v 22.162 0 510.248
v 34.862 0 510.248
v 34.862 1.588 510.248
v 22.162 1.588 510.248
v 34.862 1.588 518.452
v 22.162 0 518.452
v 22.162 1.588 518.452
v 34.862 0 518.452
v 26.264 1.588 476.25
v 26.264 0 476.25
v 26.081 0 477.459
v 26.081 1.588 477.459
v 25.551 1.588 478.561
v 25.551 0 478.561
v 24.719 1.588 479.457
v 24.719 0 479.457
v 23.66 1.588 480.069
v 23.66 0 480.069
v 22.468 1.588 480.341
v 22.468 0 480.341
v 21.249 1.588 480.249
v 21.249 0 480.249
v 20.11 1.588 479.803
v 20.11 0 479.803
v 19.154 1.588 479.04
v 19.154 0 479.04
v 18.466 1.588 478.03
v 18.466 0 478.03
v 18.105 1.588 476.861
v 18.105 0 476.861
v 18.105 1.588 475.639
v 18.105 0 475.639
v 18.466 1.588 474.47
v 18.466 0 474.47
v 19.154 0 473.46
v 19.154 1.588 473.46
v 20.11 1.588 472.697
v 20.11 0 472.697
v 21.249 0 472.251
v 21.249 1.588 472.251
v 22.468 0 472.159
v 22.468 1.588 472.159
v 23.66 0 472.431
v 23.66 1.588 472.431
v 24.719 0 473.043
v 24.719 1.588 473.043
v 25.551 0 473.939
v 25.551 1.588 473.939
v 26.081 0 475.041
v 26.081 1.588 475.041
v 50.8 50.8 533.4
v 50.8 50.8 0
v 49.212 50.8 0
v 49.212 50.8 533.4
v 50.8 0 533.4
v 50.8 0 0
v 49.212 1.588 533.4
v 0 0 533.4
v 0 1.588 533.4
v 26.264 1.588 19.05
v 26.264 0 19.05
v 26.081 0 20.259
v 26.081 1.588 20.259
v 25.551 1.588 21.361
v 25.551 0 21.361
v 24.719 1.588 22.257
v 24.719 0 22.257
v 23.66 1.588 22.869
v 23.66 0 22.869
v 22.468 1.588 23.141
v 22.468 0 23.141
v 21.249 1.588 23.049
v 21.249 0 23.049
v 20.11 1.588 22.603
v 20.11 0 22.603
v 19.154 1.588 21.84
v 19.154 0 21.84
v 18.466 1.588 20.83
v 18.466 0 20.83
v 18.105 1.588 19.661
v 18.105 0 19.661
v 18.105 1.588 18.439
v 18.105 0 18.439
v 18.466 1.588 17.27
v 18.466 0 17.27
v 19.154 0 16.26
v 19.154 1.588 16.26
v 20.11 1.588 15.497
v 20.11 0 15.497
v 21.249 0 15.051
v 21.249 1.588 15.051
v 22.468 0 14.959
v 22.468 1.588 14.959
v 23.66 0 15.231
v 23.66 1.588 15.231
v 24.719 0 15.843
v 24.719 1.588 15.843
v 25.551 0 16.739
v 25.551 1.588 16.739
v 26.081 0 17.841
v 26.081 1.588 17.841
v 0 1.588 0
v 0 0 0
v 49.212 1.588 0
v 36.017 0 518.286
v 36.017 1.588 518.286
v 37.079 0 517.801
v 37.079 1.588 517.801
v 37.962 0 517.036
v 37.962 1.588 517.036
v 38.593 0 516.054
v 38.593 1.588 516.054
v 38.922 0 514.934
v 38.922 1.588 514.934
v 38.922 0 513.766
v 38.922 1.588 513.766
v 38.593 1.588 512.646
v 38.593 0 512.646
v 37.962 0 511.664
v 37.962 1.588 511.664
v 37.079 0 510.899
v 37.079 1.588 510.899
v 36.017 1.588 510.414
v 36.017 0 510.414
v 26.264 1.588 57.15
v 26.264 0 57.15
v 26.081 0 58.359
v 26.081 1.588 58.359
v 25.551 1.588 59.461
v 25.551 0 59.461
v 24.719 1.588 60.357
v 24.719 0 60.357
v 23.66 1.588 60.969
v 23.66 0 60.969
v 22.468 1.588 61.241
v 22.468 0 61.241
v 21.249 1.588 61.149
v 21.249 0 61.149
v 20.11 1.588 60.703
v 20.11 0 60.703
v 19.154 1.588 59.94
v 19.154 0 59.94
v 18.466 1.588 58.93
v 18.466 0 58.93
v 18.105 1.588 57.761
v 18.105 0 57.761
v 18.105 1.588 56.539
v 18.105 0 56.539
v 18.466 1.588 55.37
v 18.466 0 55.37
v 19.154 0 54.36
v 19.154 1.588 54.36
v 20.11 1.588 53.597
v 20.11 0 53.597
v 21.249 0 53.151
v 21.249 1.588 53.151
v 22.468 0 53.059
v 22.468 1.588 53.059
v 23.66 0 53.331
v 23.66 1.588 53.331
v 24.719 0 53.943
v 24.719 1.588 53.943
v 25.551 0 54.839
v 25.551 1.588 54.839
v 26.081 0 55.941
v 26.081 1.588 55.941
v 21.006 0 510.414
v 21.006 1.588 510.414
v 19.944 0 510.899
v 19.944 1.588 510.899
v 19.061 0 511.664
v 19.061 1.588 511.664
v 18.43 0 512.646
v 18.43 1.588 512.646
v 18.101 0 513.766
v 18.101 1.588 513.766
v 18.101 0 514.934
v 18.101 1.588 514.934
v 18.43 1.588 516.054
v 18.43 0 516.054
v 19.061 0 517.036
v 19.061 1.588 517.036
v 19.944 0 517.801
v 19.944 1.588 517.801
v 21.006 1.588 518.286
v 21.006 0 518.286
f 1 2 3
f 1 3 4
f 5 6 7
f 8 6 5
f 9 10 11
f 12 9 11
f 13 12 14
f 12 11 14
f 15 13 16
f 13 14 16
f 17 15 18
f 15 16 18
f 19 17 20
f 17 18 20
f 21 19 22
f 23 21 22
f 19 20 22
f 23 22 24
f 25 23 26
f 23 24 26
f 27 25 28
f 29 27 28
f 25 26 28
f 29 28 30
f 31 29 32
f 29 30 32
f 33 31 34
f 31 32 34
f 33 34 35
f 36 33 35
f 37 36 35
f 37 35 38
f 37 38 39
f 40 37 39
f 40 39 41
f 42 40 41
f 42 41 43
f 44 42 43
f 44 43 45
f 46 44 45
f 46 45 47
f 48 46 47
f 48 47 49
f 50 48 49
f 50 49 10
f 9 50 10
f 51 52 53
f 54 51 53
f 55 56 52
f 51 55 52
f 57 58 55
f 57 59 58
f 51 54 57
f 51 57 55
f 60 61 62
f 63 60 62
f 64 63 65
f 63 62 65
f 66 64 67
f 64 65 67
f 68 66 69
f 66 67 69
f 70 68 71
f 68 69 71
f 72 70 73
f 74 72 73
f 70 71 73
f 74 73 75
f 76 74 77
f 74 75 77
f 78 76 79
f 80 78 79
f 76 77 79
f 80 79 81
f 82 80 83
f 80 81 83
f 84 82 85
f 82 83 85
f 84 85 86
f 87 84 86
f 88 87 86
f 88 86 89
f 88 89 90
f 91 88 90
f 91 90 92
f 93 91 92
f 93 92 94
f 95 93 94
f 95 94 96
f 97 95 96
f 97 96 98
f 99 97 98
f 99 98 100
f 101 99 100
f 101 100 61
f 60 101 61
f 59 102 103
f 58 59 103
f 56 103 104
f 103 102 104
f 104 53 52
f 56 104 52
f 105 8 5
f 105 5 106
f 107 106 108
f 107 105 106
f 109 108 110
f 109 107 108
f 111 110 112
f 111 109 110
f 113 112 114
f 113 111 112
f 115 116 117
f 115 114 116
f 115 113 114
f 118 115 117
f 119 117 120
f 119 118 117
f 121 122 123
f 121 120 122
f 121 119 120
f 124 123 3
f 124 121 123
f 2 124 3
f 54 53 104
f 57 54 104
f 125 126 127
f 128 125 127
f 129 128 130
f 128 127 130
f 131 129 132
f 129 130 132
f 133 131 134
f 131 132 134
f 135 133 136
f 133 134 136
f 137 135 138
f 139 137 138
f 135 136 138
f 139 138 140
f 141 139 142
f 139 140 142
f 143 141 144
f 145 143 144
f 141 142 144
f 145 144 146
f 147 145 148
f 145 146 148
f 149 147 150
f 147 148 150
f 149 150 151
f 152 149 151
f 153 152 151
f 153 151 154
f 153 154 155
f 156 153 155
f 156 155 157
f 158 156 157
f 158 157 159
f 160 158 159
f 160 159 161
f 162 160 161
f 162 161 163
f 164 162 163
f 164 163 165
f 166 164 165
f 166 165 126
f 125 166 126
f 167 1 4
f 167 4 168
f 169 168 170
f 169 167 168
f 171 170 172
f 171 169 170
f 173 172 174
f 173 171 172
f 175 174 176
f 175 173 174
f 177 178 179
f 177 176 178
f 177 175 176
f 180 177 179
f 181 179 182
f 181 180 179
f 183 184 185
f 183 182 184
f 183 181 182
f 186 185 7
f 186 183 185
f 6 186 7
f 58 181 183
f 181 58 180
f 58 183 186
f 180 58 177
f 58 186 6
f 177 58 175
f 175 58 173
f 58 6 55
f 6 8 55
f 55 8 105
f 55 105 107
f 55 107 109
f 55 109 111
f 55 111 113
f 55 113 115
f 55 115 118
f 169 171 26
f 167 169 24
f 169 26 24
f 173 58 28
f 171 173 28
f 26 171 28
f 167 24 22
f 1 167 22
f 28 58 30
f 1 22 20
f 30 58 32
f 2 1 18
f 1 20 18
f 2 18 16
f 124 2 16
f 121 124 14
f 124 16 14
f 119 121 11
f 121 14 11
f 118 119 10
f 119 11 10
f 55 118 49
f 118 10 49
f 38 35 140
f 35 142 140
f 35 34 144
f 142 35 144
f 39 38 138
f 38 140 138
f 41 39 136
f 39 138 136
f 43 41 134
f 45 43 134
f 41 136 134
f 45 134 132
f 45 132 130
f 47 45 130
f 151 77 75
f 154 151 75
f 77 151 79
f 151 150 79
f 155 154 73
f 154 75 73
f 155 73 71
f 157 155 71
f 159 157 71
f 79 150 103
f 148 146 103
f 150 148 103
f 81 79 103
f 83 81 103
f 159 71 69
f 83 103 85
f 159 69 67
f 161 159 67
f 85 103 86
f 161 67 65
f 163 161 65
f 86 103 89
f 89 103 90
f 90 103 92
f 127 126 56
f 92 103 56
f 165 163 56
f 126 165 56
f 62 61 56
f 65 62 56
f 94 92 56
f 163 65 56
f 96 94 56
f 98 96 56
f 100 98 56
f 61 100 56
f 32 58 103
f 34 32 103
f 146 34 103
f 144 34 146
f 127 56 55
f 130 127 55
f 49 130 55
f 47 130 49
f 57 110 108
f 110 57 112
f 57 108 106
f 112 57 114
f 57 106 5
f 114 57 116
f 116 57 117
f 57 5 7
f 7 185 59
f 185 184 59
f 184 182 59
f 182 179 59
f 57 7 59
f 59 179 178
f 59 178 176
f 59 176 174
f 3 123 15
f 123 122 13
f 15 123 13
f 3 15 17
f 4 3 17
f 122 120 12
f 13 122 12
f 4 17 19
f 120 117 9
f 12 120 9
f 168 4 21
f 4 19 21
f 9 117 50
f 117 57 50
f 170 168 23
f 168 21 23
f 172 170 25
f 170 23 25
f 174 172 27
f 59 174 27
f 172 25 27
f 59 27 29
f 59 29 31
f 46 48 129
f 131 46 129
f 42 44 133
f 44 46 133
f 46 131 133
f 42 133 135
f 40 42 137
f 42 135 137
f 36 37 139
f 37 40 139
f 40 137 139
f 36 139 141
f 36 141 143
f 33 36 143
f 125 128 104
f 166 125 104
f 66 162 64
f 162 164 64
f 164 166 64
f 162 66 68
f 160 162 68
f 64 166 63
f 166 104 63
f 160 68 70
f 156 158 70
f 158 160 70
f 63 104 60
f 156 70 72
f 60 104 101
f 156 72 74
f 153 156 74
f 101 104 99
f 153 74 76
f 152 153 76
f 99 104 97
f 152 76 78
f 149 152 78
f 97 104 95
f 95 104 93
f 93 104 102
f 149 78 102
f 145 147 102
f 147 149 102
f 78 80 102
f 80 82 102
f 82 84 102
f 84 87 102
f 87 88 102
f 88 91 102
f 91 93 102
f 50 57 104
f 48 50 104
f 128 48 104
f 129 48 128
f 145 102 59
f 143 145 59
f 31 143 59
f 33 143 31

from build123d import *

# Parameters (mm, degrees)
EXTRUDE1_DEPTH     = 533.4
SKETCH2_R          = 4.1021
CUT_EXTRUDE1_DEPTH = 51.8


with BuildPart() as part:
    # Sketch1 → Extrude1 (new body)
    with BuildSketch(Plane.XY):
        Polygon((0, 0), (50.8, 0), (50.8, 50.8), (49.2125, 50.8), (49.2125, 1.5875), (0, 1.5875), align=None)
    extrude(amount=EXTRUDE1_DEPTH)

    # Sketch2 → Cut-Extrude1 (cut, through all)
    with BuildSketch(Plane.XZ):
        with Locations((22.1615, 57.15)):
            Circle(SKETCH2_R)
        with Locations((22.1615, 476.25)):
            Circle(SKETCH2_R)
        with Locations((22.1615, 19.05)):
            Circle(SKETCH2_R)
        with BuildLine():
            Line((22.1615, 518.4521), (34.8615, 518.4521))
            ThreePointArc((34.8615, 518.4521), (38.9636, 514.35), (34.8615, 510.2479))
            Line((34.8615, 510.2479), (22.1615, 510.2479))
            ThreePointArc((22.1615, 510.2479), (18.0594, 514.35), (22.1615, 518.4521))
        make_face()
    extrude(amount=-CUT_EXTRUDE1_DEPTH, mode=Mode.SUBTRACT)


solid = part.part
